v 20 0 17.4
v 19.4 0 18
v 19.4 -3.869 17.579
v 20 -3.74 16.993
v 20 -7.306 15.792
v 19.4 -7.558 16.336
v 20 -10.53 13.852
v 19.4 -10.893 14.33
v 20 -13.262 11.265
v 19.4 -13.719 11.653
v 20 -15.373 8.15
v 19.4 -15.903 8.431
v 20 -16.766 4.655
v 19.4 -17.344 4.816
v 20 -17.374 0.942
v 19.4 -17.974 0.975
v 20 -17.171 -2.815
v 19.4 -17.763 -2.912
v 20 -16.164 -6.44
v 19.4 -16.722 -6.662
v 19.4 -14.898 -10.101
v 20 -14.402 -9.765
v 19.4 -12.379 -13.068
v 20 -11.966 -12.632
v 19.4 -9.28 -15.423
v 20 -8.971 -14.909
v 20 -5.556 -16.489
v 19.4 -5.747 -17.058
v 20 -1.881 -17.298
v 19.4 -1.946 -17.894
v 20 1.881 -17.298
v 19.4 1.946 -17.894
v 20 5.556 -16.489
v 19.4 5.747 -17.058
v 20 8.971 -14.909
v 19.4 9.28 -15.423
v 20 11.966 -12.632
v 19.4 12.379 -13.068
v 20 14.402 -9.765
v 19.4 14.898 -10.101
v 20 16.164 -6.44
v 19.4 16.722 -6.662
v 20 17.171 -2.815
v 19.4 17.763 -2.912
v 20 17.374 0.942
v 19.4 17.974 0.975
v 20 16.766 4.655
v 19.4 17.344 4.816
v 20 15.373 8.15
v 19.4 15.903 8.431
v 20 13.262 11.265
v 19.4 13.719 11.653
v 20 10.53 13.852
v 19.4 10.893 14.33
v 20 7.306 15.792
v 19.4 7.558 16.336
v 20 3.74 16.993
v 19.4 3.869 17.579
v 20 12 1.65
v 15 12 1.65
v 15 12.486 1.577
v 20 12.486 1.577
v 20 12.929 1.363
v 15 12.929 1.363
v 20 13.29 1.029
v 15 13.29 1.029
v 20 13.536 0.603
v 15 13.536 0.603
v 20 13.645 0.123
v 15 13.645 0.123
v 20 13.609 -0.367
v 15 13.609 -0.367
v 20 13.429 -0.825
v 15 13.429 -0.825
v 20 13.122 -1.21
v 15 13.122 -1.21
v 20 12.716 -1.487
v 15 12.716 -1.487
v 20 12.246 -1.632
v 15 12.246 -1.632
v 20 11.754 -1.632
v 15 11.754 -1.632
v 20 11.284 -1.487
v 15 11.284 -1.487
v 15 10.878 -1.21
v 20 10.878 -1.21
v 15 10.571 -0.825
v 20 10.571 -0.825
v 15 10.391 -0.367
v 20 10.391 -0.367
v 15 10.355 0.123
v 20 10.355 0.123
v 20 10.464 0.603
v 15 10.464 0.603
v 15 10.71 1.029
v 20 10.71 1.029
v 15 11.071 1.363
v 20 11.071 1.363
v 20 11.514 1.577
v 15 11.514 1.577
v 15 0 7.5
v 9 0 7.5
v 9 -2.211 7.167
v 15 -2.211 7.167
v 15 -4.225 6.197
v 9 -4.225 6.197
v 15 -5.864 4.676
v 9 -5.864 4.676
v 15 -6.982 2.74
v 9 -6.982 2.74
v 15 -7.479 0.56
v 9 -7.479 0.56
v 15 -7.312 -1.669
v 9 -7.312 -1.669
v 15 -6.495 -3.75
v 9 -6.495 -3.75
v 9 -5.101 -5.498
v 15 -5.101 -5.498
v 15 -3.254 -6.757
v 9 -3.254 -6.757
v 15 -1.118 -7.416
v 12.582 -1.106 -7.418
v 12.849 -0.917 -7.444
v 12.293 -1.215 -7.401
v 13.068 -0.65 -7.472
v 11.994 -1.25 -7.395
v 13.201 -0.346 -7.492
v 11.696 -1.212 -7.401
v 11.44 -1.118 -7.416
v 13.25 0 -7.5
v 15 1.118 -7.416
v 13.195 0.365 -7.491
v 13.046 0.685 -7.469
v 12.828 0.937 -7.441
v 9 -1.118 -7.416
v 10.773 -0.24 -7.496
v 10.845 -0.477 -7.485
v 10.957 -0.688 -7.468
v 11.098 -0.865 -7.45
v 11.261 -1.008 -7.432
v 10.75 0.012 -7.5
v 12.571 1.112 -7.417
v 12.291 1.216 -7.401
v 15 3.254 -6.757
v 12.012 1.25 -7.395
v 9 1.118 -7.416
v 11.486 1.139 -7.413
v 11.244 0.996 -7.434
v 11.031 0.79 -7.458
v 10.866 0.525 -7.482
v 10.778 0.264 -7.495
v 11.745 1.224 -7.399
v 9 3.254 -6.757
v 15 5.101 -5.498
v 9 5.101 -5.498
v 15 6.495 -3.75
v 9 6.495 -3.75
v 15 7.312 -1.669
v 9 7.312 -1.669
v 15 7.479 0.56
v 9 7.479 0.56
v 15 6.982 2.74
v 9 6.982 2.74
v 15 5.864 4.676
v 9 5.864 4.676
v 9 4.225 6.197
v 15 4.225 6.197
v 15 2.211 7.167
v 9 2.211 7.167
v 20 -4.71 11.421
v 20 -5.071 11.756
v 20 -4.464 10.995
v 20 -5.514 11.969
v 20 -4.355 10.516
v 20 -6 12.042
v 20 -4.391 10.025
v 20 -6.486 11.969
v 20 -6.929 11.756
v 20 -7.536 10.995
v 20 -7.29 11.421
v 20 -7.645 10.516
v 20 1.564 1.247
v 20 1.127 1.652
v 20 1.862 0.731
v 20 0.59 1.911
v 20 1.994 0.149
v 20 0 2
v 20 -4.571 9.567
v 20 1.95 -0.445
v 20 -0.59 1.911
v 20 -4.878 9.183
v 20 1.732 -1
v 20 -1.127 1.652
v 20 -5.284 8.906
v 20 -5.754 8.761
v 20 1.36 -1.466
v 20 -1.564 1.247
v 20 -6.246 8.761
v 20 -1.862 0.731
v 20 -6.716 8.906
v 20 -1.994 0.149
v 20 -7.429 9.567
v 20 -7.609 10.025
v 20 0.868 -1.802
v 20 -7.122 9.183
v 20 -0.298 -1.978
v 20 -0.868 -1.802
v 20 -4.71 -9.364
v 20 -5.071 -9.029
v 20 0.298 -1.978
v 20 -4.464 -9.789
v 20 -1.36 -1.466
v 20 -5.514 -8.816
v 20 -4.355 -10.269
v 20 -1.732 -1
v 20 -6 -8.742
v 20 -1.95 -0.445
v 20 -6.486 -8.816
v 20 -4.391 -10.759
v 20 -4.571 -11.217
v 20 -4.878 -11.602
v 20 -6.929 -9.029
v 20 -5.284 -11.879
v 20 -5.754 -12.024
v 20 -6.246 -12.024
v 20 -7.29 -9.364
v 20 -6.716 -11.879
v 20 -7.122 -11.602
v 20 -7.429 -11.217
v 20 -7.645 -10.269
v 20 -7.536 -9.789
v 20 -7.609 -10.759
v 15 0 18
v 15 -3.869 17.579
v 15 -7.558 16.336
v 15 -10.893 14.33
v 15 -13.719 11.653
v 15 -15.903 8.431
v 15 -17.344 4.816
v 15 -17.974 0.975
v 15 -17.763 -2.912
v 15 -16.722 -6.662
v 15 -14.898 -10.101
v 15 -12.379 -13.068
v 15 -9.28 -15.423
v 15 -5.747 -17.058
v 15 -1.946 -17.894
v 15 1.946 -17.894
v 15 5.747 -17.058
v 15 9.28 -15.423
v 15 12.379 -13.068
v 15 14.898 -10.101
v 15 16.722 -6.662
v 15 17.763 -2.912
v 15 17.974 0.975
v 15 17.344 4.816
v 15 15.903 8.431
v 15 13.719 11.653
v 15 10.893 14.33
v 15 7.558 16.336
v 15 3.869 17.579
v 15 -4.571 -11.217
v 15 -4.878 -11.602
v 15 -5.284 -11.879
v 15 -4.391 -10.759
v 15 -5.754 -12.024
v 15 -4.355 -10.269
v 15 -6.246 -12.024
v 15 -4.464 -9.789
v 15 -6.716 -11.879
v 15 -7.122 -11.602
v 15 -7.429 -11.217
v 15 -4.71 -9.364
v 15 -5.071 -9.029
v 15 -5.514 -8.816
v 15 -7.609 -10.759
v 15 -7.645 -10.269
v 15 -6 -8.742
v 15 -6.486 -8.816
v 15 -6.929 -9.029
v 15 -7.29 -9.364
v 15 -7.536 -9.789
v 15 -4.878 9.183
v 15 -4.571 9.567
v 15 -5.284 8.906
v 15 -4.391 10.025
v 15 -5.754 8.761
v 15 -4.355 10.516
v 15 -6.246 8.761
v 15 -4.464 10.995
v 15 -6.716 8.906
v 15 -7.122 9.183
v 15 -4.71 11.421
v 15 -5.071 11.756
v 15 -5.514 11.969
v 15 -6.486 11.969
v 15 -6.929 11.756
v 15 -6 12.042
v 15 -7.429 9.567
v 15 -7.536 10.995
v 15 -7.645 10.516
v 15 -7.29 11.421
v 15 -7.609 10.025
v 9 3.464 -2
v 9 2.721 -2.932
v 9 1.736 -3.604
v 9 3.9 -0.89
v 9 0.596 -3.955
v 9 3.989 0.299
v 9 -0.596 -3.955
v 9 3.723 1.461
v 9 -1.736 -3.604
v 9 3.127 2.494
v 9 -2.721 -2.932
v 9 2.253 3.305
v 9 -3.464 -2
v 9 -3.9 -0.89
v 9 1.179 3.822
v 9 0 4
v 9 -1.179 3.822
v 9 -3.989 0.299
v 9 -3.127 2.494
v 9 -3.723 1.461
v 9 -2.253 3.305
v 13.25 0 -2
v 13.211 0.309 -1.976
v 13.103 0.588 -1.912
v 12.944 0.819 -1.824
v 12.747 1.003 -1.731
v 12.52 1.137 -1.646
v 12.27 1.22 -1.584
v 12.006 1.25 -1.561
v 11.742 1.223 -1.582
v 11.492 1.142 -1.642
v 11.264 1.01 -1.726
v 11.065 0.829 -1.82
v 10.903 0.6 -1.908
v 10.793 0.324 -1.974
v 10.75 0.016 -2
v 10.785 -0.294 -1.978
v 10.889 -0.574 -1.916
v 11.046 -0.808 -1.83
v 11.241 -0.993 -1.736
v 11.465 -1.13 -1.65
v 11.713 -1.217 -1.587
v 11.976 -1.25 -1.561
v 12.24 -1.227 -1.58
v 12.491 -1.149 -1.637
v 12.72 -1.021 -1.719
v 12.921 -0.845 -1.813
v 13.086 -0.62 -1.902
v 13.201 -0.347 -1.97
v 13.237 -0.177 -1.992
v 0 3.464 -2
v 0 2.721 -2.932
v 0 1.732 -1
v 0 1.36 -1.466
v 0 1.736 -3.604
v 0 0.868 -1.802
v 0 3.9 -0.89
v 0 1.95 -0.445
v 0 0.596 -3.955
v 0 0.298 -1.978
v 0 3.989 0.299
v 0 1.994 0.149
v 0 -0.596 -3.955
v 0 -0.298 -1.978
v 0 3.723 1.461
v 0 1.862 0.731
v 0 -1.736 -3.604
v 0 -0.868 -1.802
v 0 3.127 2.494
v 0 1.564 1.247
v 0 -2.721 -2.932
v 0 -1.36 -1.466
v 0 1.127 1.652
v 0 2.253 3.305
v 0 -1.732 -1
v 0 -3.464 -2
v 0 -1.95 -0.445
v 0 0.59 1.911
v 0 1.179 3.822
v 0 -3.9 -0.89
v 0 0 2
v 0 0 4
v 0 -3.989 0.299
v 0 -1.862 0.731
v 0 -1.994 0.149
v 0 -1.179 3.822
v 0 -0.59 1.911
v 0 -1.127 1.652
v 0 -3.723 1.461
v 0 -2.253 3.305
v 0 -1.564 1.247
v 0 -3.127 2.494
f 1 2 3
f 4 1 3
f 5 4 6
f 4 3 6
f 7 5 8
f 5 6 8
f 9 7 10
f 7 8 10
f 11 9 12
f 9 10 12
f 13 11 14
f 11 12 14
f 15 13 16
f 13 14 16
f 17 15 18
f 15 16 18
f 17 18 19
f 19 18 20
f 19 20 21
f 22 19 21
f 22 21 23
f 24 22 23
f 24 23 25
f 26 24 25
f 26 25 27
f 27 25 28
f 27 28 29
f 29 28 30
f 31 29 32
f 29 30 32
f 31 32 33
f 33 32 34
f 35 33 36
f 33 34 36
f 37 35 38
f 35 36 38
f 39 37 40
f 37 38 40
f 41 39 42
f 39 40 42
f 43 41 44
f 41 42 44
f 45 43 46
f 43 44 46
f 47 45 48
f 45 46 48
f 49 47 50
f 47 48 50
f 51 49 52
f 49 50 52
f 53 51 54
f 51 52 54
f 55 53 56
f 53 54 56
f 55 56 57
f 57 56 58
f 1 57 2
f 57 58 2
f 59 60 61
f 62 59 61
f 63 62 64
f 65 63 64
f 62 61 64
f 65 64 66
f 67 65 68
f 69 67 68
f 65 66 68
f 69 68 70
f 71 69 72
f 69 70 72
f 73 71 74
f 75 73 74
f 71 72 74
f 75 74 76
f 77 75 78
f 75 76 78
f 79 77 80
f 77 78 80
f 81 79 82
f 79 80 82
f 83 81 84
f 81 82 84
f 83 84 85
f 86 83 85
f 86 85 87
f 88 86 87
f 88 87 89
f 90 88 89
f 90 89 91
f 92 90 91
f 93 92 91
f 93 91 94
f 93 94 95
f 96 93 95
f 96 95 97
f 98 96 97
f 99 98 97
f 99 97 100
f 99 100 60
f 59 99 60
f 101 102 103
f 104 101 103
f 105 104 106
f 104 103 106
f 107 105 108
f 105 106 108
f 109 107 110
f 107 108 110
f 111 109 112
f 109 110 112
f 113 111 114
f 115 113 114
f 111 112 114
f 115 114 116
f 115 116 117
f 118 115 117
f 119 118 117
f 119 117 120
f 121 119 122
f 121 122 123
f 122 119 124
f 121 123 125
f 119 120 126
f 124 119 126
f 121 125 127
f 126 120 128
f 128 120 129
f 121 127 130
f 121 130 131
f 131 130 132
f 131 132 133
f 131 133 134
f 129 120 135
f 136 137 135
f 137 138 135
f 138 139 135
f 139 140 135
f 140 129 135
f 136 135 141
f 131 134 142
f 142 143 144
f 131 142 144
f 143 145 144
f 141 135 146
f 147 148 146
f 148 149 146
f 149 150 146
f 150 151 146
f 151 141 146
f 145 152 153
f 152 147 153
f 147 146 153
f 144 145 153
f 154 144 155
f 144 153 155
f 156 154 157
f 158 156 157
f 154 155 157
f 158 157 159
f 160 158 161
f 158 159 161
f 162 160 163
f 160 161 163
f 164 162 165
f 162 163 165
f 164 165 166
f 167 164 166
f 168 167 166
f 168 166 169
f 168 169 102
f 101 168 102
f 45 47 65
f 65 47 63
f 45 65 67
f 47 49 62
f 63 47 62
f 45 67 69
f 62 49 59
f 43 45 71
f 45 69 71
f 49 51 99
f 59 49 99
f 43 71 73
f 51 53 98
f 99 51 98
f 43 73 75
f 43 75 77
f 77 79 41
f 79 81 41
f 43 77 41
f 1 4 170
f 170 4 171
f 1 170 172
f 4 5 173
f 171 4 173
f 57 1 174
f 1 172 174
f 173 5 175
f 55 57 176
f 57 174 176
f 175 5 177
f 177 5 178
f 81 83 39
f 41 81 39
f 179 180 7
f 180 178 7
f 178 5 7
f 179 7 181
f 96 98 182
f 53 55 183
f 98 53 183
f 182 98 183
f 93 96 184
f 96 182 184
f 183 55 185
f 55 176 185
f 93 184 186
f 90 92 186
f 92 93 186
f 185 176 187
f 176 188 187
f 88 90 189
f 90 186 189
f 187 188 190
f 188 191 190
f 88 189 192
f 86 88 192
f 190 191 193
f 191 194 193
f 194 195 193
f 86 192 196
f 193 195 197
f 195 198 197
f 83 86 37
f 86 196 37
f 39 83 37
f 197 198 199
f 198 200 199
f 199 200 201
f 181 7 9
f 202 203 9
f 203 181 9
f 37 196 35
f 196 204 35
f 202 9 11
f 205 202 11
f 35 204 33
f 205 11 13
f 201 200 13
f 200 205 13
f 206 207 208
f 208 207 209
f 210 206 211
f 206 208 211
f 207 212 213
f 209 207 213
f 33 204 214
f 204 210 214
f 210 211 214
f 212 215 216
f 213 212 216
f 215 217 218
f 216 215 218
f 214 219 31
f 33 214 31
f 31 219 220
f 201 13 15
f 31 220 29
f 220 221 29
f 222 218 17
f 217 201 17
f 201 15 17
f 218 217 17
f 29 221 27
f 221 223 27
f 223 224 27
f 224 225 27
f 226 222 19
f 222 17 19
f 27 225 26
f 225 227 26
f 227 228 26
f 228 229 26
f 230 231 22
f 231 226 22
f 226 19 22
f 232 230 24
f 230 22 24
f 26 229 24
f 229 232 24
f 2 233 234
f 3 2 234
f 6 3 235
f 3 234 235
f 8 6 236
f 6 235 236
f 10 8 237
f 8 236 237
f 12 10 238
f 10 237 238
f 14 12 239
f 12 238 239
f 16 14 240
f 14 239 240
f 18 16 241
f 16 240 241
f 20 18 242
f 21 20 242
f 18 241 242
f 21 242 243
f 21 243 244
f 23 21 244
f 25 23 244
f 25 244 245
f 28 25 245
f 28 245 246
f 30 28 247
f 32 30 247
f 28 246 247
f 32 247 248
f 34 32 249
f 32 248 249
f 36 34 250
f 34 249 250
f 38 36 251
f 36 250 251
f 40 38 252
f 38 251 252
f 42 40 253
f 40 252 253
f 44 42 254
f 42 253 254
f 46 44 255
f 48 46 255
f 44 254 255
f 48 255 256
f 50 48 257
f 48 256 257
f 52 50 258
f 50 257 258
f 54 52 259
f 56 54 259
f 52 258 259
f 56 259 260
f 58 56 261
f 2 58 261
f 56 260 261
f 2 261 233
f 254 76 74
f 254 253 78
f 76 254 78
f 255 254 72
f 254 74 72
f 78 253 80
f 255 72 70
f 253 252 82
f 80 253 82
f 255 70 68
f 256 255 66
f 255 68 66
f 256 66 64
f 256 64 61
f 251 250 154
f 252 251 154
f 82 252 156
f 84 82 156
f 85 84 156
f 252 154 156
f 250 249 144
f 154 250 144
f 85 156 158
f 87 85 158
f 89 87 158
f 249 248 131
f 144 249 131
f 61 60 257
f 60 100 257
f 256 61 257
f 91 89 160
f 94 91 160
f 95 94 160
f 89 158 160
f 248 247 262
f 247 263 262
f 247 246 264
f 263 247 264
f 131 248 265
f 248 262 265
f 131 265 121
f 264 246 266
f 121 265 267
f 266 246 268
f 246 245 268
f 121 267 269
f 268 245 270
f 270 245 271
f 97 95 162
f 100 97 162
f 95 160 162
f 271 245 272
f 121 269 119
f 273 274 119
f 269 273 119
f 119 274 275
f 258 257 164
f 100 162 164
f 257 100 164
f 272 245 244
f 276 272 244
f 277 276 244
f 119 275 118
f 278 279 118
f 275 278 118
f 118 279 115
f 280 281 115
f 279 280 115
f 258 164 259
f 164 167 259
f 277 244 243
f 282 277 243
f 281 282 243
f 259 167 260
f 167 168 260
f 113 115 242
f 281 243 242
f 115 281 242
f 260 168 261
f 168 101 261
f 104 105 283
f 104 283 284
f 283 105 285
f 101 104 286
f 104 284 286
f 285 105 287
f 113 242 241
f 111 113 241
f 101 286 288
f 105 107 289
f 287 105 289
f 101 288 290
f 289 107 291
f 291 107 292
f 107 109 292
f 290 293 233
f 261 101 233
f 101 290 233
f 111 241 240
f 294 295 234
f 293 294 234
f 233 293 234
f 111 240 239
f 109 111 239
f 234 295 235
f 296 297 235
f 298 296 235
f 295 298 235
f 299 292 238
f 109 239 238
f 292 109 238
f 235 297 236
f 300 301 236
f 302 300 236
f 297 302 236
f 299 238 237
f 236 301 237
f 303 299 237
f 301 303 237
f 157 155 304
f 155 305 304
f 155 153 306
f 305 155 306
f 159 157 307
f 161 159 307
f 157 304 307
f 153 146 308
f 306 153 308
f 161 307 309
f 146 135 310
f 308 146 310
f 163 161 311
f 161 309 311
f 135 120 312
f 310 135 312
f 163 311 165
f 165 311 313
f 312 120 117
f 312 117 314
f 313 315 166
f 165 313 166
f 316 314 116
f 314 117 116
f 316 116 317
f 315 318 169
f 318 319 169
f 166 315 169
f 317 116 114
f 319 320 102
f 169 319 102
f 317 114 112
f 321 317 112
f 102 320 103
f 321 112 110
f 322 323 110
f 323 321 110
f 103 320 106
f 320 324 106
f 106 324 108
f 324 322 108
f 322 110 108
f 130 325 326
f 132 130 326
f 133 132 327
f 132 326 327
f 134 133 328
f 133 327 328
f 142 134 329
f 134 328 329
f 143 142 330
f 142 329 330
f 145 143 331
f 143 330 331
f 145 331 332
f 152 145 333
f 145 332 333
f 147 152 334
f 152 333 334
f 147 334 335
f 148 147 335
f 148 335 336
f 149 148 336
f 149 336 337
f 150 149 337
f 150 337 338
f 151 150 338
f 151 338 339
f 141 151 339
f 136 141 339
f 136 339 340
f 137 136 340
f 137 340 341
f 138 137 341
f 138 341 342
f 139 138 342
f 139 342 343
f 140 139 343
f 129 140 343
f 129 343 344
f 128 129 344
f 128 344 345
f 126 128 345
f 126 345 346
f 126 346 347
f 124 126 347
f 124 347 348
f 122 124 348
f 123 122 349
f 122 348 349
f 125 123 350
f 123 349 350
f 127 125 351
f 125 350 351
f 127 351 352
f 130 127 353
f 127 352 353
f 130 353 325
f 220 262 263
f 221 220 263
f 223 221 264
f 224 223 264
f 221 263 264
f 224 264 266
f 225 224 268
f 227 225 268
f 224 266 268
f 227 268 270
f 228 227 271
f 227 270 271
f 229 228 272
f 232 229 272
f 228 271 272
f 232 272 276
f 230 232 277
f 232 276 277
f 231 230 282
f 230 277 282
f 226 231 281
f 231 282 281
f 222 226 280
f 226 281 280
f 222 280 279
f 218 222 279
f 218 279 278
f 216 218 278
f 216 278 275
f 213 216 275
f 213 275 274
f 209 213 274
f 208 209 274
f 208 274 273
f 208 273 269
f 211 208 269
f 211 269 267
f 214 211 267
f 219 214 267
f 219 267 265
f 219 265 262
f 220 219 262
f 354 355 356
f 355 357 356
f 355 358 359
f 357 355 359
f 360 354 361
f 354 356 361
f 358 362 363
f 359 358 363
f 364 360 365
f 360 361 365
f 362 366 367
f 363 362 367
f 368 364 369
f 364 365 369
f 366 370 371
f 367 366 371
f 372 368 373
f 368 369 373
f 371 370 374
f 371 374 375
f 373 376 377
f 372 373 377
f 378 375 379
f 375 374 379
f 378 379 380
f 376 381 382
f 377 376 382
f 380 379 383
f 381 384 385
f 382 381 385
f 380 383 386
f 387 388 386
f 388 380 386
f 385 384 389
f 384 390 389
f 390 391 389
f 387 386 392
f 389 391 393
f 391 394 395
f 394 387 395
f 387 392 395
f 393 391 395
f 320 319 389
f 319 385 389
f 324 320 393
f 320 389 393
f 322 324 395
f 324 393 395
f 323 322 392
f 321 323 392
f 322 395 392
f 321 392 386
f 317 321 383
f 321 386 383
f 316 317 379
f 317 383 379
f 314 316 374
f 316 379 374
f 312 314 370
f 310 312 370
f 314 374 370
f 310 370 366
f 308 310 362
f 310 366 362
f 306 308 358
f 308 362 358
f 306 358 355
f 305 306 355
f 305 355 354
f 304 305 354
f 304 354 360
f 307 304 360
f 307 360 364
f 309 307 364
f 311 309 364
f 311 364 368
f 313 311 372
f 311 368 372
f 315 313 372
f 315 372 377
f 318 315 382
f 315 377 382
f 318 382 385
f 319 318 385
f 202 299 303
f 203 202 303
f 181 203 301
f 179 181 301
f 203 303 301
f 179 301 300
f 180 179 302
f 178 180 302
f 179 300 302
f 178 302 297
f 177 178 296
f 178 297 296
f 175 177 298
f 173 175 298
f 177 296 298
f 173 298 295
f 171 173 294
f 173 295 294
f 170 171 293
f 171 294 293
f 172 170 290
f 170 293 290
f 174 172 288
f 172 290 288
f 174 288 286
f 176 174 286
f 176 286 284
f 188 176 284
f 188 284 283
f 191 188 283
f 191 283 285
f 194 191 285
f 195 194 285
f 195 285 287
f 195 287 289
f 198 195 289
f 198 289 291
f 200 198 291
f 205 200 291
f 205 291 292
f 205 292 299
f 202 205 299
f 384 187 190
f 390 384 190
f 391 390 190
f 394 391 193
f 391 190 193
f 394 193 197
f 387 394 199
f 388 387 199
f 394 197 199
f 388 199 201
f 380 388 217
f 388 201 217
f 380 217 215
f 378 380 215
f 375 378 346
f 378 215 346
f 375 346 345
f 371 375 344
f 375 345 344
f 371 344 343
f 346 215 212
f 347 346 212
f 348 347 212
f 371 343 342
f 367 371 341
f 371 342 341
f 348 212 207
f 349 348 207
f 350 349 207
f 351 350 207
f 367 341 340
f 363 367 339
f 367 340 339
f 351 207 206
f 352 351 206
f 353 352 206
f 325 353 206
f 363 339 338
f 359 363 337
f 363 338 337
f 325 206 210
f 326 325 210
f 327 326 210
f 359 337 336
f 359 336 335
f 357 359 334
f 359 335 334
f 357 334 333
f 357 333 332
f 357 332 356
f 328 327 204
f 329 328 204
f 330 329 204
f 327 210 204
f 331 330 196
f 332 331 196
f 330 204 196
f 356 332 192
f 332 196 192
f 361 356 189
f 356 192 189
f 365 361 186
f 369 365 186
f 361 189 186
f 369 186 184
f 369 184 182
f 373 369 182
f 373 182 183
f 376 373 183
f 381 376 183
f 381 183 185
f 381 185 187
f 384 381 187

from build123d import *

# Parameters (mm, degrees)
ESQUISSE2_R                  = 1.25
ENL_V_MAT_EXTRU_1_DEPTH      = 33.372828112
TROU_TARAUD_M41_D            = 3.3
R_P_TITION_CIRCULAIRE1_COUNT = 3
CHANFREIN1_SIZE              = 0.6


with BuildPart() as part:
    # Esquisse1 → Révolution1 (revolve)
    with BuildSketch(Plane.XY, mode=Mode.PRIVATE) as r_volution1_sk:
        Polygon((0, 2), (20, 2), (20, 18), (15, 18), (15, 7.5), (9, 7.5), (9, 4), (0, 4), align=None)
    revolve(r_volution1_sk.sketch.rotate(Axis((0, 0, 0), (1, 0, 0)), 90), axis=Axis((0, 0, 0), (1, 0, 0)))

    # Esquisse2 → Enlèv. mat.-Extru.1 (cut, through all)
    with BuildSketch(Plane.XY):
        with Locations((12, 0)):
            Circle(ESQUISSE2_R)
    extrude(amount=-ENL_V_MAT_EXTRU_1_DEPTH, mode=Mode.SUBTRACT)

    # Trou taraudé M41 (through all)
    with Locations(Plane(origin=(20, 0, 0), x_dir=(0, 0, -1), z_dir=(1, 0, 0))):
        with Locations((0, 12)):
            trou_taraud_m41 = Hole(TROU_TARAUD_M41_D / 2)

    # Répétition circulaire1: Trou taraudé M41 ×3 about axis
    r_p_tition_circulaire1_axis = Axis((0, 0, 0), (1, 0, 0))
    for i in range(1, R_P_TITION_CIRCULAIRE1_COUNT):
        add(trou_taraud_m41.rotate(r_p_tition_circulaire1_axis, i * 360 / R_P_TITION_CIRCULAIRE1_COUNT), mode=Mode.SUBTRACT)

    # Chanfrein1
    chanfrein1_edges = [part.edges().sort_by_distance(p)[0] for p in [
        (20, 0, -18),
    ]]
    chamfer(chanfrein1_edges, length=CHANFREIN1_SIZE)


solid = part.part
